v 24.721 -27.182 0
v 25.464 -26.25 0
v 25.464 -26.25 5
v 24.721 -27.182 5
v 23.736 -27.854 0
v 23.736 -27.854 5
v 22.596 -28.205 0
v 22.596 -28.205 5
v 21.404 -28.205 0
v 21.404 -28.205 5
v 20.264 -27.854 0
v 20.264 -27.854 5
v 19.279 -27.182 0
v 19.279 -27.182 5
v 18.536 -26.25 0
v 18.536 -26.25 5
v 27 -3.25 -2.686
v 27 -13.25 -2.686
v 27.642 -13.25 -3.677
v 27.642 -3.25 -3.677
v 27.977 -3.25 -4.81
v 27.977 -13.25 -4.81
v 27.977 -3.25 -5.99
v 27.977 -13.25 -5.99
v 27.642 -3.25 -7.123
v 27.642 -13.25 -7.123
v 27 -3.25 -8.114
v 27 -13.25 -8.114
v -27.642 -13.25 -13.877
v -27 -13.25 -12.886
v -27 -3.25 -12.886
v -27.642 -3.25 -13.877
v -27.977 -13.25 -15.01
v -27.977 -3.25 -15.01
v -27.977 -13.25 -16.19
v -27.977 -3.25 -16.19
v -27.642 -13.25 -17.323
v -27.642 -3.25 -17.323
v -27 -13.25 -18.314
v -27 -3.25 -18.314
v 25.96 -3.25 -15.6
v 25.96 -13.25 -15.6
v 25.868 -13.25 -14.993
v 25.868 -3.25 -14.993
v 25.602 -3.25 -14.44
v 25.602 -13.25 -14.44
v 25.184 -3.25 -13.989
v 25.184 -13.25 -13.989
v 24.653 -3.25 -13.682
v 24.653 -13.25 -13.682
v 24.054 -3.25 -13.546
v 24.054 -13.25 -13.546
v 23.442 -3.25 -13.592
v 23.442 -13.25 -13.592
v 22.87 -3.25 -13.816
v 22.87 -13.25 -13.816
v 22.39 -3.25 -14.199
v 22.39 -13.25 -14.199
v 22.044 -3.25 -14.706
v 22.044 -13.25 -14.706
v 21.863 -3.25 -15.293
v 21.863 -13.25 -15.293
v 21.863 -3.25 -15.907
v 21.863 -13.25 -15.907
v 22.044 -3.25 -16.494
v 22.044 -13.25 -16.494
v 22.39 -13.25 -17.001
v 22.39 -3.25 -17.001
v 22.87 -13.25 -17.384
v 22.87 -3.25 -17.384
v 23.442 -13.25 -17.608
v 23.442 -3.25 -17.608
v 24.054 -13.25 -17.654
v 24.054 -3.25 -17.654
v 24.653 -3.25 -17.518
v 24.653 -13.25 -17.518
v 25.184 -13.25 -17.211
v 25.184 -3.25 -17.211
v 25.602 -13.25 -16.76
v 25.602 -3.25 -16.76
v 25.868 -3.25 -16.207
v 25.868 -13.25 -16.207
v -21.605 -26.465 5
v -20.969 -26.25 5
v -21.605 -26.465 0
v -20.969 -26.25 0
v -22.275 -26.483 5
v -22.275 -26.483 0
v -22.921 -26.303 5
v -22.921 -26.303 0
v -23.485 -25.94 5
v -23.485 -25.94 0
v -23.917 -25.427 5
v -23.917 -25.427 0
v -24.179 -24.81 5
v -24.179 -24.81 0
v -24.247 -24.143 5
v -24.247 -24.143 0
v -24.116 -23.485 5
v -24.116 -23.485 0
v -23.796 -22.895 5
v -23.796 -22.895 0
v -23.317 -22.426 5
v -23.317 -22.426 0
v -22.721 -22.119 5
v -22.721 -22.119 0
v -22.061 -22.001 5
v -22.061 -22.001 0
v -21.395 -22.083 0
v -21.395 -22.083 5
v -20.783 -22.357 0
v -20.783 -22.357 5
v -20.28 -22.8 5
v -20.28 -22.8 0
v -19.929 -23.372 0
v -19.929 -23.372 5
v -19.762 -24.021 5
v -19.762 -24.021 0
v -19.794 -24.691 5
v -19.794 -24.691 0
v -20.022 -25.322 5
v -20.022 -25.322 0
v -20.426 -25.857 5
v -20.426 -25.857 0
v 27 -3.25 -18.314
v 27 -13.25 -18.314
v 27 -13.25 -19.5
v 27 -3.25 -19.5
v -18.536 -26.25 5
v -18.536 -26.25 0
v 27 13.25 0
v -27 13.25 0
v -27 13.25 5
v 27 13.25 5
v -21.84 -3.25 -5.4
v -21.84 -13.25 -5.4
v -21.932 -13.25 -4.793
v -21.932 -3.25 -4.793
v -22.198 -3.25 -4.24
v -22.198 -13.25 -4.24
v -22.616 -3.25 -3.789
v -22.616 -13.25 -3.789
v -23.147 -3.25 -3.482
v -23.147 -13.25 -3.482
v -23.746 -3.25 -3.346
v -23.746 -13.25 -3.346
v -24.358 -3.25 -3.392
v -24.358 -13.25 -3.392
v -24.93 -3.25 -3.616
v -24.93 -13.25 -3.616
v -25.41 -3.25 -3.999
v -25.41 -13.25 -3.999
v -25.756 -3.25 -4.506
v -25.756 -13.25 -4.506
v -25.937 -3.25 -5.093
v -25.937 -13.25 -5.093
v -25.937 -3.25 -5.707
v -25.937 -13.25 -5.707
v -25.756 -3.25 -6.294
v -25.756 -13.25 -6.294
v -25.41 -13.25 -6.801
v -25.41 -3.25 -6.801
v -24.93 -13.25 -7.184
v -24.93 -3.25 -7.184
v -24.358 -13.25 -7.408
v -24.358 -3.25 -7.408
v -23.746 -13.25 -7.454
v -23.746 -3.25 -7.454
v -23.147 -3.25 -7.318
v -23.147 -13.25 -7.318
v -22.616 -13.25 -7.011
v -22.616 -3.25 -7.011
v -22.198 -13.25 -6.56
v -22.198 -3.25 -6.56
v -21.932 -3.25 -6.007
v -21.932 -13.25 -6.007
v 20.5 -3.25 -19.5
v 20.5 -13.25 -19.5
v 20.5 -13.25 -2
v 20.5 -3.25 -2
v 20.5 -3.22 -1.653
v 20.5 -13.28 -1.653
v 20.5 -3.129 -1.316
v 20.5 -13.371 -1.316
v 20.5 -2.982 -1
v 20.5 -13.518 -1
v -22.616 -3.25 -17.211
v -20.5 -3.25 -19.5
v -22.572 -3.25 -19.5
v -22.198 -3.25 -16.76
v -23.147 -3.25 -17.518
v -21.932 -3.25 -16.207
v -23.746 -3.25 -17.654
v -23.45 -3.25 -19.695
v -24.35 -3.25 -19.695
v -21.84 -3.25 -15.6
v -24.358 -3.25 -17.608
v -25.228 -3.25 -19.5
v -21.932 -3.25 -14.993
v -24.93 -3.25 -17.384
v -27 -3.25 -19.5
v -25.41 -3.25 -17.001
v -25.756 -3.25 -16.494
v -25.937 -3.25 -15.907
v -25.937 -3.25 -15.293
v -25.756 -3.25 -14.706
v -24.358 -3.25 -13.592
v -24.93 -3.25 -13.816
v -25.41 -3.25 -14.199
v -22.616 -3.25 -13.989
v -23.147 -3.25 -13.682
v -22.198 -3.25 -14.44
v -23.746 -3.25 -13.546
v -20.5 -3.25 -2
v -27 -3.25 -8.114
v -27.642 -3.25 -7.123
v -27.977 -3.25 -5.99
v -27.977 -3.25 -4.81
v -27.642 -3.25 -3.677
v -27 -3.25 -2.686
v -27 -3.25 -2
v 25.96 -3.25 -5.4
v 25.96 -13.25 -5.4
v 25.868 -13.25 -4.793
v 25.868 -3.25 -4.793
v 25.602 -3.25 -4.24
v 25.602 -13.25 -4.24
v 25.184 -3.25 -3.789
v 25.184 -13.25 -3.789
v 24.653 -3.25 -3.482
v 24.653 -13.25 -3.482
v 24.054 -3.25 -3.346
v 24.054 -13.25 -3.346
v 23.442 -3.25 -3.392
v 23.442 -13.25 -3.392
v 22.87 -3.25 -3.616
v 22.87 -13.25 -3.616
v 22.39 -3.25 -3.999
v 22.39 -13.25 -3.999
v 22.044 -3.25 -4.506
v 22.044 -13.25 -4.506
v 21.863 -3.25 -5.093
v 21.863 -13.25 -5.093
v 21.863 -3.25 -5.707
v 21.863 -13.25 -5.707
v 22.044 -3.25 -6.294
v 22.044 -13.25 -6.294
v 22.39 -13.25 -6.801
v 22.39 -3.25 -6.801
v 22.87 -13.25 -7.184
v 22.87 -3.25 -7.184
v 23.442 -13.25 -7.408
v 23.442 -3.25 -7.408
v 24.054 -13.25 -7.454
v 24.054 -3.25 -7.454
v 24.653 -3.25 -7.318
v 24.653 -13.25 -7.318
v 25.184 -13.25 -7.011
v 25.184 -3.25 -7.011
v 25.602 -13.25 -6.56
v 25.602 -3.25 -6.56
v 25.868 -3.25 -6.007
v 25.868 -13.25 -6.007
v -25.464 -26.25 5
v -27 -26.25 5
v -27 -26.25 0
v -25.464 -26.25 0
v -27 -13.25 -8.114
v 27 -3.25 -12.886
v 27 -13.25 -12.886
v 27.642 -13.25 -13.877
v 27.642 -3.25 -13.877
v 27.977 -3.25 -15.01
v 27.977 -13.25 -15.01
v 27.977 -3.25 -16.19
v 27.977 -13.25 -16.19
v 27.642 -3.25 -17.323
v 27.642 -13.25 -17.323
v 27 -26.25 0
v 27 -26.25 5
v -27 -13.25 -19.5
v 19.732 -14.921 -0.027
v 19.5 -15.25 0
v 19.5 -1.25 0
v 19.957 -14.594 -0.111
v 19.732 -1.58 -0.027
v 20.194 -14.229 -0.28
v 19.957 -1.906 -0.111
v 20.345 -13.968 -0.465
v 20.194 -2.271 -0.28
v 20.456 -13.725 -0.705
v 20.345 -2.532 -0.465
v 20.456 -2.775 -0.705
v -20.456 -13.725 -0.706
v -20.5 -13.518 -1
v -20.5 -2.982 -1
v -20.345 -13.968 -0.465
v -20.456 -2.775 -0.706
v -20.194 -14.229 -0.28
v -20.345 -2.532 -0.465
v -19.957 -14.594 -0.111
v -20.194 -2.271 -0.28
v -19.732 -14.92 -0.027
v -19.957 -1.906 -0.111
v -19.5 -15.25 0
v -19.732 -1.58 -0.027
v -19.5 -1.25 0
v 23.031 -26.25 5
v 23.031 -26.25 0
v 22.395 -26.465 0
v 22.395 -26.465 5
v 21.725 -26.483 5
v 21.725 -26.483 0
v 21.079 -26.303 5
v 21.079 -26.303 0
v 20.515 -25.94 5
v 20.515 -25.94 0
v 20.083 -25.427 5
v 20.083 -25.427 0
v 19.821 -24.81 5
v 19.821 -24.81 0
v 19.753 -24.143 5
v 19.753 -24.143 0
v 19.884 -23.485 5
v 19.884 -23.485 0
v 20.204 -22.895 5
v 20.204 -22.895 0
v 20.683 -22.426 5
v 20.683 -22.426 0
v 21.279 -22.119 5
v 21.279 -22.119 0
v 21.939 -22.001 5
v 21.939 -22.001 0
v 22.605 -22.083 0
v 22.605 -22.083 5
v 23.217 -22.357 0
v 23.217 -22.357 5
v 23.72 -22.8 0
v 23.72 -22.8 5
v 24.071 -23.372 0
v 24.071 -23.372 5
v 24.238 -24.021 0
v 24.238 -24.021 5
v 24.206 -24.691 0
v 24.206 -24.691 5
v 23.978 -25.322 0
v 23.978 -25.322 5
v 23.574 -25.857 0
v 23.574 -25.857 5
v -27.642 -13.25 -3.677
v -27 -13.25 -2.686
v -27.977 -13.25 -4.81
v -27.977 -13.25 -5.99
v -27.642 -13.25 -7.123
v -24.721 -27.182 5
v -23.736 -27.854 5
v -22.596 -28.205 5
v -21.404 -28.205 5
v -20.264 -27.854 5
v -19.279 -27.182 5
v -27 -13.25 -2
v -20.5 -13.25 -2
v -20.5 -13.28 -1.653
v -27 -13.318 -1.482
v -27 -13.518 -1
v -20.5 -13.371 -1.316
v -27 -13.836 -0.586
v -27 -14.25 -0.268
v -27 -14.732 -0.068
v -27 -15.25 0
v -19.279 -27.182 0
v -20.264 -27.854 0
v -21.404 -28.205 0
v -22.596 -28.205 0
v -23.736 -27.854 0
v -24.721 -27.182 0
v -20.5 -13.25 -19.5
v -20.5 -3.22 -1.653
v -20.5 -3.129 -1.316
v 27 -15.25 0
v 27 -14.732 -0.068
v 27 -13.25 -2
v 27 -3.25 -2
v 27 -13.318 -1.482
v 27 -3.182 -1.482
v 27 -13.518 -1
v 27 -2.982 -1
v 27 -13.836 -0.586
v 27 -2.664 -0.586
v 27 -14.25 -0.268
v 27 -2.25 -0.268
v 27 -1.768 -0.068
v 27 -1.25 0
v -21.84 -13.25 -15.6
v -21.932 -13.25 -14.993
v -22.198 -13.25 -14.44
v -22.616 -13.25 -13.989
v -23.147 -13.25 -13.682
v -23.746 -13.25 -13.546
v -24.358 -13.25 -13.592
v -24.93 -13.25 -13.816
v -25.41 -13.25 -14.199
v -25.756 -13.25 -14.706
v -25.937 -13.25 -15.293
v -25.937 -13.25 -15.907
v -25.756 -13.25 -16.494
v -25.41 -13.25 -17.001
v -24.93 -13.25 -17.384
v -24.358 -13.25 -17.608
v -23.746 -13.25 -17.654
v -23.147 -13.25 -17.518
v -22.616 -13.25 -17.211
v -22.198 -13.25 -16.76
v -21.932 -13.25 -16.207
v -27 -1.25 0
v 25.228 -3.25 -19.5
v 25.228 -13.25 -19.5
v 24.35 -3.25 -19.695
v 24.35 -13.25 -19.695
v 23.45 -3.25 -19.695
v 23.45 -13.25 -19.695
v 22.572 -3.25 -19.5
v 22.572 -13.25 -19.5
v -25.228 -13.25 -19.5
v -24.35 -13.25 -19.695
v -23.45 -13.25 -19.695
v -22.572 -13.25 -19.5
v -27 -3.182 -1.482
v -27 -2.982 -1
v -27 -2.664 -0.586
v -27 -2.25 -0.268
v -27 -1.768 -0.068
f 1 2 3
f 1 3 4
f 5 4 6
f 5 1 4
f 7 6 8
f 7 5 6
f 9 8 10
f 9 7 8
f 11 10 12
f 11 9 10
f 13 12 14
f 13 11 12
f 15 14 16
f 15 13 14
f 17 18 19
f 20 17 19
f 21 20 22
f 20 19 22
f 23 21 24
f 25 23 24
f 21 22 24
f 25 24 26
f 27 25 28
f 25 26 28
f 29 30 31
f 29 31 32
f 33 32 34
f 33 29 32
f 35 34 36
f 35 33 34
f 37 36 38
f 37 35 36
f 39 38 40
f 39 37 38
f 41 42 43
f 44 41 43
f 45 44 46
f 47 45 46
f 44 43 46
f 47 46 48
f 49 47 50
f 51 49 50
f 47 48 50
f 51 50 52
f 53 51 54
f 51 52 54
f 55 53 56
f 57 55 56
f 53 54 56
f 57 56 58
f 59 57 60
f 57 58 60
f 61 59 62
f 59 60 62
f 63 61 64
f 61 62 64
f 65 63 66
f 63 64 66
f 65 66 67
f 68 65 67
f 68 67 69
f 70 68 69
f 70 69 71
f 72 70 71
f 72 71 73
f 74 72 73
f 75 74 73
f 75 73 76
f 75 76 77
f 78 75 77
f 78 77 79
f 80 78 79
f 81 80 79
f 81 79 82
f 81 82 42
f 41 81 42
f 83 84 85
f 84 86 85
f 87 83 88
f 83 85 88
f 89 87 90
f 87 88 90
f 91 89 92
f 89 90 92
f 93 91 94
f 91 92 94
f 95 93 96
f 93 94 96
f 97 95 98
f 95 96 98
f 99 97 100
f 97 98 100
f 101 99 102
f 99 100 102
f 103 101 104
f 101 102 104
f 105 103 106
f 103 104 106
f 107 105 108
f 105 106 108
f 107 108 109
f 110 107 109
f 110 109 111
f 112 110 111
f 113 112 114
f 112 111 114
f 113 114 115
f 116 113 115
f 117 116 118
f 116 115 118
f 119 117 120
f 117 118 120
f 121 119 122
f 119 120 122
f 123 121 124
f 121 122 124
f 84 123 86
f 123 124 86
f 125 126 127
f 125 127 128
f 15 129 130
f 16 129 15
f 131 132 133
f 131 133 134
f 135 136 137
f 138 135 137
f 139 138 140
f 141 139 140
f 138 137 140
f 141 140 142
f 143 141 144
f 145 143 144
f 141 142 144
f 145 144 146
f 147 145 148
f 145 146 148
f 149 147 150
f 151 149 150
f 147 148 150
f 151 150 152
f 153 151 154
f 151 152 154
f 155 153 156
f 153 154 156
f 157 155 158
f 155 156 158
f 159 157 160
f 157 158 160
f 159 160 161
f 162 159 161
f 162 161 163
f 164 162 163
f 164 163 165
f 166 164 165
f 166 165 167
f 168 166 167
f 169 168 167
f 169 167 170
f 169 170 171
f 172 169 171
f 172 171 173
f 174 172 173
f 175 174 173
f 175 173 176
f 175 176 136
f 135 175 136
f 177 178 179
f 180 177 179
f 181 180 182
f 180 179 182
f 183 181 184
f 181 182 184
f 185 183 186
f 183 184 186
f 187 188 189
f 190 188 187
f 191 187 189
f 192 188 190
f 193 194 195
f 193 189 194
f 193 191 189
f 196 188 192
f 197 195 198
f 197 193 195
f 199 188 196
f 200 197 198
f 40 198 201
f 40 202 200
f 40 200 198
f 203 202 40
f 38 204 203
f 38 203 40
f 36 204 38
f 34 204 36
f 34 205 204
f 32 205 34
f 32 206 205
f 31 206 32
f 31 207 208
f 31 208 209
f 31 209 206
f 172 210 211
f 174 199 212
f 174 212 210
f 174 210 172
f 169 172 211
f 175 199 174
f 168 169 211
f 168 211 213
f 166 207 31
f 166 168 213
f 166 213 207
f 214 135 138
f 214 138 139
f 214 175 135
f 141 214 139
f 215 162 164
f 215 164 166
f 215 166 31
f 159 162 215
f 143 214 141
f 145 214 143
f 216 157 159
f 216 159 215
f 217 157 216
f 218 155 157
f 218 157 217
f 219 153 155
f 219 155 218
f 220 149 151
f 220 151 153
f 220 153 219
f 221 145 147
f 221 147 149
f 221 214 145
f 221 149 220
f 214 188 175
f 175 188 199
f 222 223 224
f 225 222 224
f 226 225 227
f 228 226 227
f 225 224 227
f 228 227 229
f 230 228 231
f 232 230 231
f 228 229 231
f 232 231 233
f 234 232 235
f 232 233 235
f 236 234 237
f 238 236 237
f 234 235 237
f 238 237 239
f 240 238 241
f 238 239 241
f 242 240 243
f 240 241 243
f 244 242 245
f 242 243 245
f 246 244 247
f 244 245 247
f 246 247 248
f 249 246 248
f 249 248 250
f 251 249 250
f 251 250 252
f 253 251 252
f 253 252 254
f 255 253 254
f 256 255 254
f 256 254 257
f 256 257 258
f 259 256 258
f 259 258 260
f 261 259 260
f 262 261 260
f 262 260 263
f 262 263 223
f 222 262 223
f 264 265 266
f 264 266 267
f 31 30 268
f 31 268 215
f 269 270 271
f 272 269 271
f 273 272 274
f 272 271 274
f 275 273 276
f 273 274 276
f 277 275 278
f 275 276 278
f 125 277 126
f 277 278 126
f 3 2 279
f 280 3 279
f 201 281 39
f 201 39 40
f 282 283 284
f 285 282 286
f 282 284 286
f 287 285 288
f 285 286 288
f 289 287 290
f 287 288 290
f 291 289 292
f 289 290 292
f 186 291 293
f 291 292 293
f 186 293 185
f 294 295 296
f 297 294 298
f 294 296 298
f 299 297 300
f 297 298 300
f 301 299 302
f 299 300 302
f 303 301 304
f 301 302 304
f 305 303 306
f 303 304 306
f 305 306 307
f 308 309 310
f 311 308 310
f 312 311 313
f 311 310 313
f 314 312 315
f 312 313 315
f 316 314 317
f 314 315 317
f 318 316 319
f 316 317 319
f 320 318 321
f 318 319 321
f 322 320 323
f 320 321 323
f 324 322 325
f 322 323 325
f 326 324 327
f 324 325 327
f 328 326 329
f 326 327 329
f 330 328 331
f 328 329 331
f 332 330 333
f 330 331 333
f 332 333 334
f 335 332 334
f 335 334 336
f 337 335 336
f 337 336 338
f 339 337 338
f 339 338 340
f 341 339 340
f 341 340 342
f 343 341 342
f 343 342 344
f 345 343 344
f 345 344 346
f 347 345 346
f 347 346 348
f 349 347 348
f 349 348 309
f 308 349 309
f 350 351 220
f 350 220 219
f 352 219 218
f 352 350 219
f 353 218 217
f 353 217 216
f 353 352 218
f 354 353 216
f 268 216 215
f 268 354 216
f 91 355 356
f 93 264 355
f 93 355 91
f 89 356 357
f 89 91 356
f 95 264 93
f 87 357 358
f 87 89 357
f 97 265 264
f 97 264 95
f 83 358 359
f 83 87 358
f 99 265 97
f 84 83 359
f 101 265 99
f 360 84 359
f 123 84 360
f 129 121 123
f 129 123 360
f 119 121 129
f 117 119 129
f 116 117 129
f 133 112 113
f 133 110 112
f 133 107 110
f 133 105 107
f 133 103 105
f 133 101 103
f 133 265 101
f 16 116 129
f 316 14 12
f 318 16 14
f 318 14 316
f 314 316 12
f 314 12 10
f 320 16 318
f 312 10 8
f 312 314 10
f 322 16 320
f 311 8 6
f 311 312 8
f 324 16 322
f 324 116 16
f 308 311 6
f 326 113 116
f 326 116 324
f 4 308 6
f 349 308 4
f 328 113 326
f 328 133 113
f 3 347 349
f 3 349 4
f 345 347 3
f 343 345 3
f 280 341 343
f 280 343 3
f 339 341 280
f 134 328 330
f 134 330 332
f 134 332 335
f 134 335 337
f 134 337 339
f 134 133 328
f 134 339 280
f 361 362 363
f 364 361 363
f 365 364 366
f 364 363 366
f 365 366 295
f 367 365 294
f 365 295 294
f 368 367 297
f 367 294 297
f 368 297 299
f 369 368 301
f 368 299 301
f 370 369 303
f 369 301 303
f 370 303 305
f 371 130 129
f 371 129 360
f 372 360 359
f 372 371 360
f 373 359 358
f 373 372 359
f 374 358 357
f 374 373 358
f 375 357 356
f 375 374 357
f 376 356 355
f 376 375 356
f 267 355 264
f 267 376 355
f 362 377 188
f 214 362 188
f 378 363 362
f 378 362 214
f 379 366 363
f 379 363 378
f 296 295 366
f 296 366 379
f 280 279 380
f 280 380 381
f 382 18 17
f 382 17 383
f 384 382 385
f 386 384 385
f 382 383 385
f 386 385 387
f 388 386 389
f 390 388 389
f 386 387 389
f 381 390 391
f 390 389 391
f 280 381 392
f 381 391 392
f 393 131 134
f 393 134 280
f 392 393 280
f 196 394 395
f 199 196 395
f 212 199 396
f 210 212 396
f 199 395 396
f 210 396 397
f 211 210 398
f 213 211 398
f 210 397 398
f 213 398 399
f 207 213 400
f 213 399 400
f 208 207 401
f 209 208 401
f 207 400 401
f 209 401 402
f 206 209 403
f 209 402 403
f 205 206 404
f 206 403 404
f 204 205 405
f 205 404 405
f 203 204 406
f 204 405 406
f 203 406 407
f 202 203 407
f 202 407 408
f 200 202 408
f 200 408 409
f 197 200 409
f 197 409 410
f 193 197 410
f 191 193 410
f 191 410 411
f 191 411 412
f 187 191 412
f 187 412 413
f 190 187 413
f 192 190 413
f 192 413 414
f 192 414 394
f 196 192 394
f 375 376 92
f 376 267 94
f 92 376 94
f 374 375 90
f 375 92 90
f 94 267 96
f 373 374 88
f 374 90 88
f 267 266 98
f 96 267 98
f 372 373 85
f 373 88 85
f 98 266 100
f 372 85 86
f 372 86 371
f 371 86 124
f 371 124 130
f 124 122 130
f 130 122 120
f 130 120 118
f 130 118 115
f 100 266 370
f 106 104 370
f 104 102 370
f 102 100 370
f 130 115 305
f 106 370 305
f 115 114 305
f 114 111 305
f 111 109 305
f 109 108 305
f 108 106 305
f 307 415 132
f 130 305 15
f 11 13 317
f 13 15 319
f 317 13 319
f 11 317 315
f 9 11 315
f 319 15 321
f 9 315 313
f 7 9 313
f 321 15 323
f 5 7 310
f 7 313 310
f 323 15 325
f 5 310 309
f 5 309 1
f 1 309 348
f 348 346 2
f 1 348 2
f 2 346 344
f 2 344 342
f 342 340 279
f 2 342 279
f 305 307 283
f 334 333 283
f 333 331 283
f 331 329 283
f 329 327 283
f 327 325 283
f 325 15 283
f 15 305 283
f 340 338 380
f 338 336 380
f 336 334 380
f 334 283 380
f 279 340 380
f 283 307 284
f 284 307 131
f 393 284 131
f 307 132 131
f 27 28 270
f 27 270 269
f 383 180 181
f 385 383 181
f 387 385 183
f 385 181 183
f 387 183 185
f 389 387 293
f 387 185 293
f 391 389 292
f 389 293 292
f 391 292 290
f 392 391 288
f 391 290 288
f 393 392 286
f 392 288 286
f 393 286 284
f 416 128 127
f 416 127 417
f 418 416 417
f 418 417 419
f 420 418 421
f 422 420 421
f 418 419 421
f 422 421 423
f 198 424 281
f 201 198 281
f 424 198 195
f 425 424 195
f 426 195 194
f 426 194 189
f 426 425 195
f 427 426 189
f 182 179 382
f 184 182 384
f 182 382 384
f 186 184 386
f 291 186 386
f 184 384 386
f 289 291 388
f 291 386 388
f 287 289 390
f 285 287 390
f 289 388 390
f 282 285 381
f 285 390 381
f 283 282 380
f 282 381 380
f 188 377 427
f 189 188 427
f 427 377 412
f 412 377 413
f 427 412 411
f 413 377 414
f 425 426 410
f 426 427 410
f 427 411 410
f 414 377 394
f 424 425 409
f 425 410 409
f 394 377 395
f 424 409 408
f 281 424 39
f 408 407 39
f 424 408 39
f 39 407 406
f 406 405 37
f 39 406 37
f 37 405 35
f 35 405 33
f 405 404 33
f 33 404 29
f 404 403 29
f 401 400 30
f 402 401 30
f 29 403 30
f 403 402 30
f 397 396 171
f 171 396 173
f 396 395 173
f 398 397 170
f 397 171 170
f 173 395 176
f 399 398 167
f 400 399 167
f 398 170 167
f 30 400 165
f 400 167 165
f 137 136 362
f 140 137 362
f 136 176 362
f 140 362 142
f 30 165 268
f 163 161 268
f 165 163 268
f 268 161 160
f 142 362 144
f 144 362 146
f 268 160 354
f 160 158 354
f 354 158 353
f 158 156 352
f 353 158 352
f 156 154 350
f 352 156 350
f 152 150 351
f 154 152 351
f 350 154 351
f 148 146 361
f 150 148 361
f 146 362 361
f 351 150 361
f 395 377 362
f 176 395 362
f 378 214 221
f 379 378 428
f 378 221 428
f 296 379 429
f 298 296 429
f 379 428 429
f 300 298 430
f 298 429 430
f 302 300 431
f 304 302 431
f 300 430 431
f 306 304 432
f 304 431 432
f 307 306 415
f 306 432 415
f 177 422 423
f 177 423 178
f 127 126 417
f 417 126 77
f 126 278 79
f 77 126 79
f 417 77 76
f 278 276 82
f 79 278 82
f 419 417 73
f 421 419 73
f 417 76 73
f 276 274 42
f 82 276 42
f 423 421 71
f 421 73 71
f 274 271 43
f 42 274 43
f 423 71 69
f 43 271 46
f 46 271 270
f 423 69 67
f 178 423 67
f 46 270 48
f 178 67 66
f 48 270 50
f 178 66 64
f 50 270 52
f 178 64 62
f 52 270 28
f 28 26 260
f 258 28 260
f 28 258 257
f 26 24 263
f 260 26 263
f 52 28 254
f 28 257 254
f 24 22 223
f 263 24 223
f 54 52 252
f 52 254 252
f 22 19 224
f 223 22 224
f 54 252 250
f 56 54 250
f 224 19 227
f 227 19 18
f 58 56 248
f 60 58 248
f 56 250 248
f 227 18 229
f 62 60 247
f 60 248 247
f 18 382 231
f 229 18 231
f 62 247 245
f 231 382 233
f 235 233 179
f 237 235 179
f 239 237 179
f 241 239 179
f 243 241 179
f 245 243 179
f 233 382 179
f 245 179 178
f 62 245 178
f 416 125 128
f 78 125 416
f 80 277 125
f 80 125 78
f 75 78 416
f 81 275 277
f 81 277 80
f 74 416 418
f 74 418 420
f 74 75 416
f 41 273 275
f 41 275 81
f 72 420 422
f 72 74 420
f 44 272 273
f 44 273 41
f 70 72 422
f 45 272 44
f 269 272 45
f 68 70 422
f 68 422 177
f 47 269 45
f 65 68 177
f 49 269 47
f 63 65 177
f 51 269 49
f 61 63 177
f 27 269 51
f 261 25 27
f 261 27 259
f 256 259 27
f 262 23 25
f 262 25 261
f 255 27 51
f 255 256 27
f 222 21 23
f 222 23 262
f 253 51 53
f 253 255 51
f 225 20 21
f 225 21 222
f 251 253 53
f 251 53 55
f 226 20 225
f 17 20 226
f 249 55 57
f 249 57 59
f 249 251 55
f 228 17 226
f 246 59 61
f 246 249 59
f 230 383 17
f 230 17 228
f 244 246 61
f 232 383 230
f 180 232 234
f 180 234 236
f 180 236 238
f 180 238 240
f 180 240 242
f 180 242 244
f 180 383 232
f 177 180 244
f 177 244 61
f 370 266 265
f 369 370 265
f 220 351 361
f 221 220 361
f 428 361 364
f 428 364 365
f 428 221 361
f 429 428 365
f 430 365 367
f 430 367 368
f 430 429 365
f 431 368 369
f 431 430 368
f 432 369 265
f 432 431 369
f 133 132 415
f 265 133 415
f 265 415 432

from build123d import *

# Parameters (mm, degrees)
SKETCH1_W           = 54
SKETCH1_H           = 26.5
BOSS_EXTRUDE1_DEPTH = 5
SKETCH2_W           = 6.5
SKETCH2_H           = 10
BOSS_EXTRUDE2_DEPTH = 19.5
SKETCH3_R           = 2.06
CUT_EXTRUDE1_DEPTH  = 19
SKETCH4_R           = 2.06
BOSS_EXTRUDE3_DEPTH = 10
FILLET1_R           = 1
FILLET2_R           = 2
SKETCH5_W           = 54
SKETCH5_H           = 5
BOSS_EXTRUDE4_DEPTH = 13
SKETCH6_R           = 2.25
CUT_EXTRUDE2_DEPTH  = 15
FILLET3_R           = 2
SKETCH7_R           = 4
SKETCH7_R_2         = 2.25
BOSS_EXTRUDE5_DEPTH = 5


with BuildPart() as part:
    # Sketch1 → Boss-Extrude1 (new body)
    with BuildSketch(Plane.XY):
        Rectangle(SKETCH1_W, SKETCH1_H)
    extrude(amount=BOSS_EXTRUDE1_DEPTH)

    # Sketch2 → Boss-Extrude2 (add)
    with BuildSketch(Plane(origin=(0, 0, 0), x_dir=(-1, 0, 0), z_dir=(0, 0, -1))):
        with Locations((-23.75, -8.25)):
            Rectangle(SKETCH2_W, SKETCH2_H)
        with Locations((23.75, -8.25)):
            Rectangle(SKETCH2_W, SKETCH2_H)
    extrude(amount=BOSS_EXTRUDE2_DEPTH)

    # Sketch3 → Cut-Extrude1 (cut)
    with BuildSketch(Plane.XZ.offset(13.25)):
        with Locations((23.9, -15.6)):
            Circle(SKETCH3_R)
        with Locations((-23.9, -5.4)):
            Circle(SKETCH3_R)
        with Locations((23.9, -5.4)):
            Circle(SKETCH3_R)
        with Locations((-23.9, -15.6)):
            Circle(SKETCH3_R)
    extrude(amount=-CUT_EXTRUDE1_DEPTH, mode=Mode.SUBTRACT)

    # Sketch4 → Boss-Extrude3 (add)
    with BuildSketch(Plane.XZ.offset(13.25)):
        with BuildLine():
            Line((20.5, -17.926886332), (20.5, -13.273113668))
            ThreePointArc((20.5, -13.273113668), (28.02, -15.6), (20.5, -17.926886332))
        make_face()
        with Locations((23.9, -15.6)):
            Circle(SKETCH4_R, mode=Mode.SUBTRACT)
        with BuildLine():
            Line((20.5, -7.726886332), (20.5, -3.073113668))
            ThreePointArc((20.5, -3.073113668), (28.02, -5.4), (20.5, -7.726886332))
        make_face()
        with Locations((23.9, -5.4)):
            Circle(SKETCH4_R, mode=Mode.SUBTRACT)
        with BuildLine():
            Line((-20.5, -7.726886332), (-20.5, -3.073113668))
            ThreePointArc((-20.5, -3.073113668), (-28.02, -5.4), (-20.5, -7.726886332))
        make_face()
        with Locations((-23.9, -5.4)):
            Circle(SKETCH4_R, mode=Mode.SUBTRACT)
        with BuildLine():
            Line((-20.5, -17.926886332), (-20.5, -13.273113668))
            ThreePointArc((-20.5, -13.273113668), (-28.02, -15.6), (-20.5, -17.926886332))
        make_face()
        with Locations((-23.9, -15.6)):
            Circle(SKETCH4_R, mode=Mode.SUBTRACT)
    extrude(amount=-BOSS_EXTRUDE3_DEPTH)

    # Fillet1
    fillet1_edges = [part.edges().sort_by_distance(p)[0] for p in [
        (20.5, -8.25, 0),
        (-20.5, -8.25, 0),
    ]]
    fillet(fillet1_edges, radius=FILLET1_R)

    # Fillet2
    fillet2_edges = [part.edges().sort_by_distance(p)[0] for p in [
        (23.75, -3.25, 0),
        (-23.75, -3.25, 0),
    ]]
    fillet(fillet2_edges, radius=FILLET2_R)

    # Sketch5 → Boss-Extrude4 (add)
    with BuildSketch(Plane.XZ.offset(13.25)):
        with Locations((0, 2.5)):
            Rectangle(SKETCH5_W, SKETCH5_H)
    extrude(amount=BOSS_EXTRUDE4_DEPTH)

    # Sketch6 → Cut-Extrude2 (cut)
    with BuildSketch(Plane(origin=(0, 0, 0), x_dir=(-1, 0, 0), z_dir=(0, 0, -1))):
        with Locations((22, -24.25)):
            Circle(SKETCH6_R)
        with Locations((-22, -24.25)):
            Circle(SKETCH6_R)
    extrude(amount=-CUT_EXTRUDE2_DEPTH, mode=Mode.SUBTRACT)

    # Fillet3
    fillet3_edges = [part.edges().sort_by_distance(p)[0] for p in [
        (23.25, -13.25, 0),
        (-23.25, -13.25, 0),
    ]]
    fillet(fillet3_edges, radius=FILLET3_R)

    # Sketch7 → Boss-Extrude5 (add)
    with BuildSketch(Plane(origin=(0, 0, 0), x_dir=(-1, 0, 0), z_dir=(0, 0, -1))):
        with Locations((22, -24.25)):
            Circle(SKETCH7_R)
        with Locations((22, -24.25)):
            Circle(SKETCH7_R_2, mode=Mode.SUBTRACT)
        with Locations((-22, -24.25)):
            Circle(SKETCH7_R)
        with Locations((-22, -24.25)):
            Circle(SKETCH7_R_2, mode=Mode.SUBTRACT)
    extrude(amount=-BOSS_EXTRUDE5_DEPTH)


solid = part.part
